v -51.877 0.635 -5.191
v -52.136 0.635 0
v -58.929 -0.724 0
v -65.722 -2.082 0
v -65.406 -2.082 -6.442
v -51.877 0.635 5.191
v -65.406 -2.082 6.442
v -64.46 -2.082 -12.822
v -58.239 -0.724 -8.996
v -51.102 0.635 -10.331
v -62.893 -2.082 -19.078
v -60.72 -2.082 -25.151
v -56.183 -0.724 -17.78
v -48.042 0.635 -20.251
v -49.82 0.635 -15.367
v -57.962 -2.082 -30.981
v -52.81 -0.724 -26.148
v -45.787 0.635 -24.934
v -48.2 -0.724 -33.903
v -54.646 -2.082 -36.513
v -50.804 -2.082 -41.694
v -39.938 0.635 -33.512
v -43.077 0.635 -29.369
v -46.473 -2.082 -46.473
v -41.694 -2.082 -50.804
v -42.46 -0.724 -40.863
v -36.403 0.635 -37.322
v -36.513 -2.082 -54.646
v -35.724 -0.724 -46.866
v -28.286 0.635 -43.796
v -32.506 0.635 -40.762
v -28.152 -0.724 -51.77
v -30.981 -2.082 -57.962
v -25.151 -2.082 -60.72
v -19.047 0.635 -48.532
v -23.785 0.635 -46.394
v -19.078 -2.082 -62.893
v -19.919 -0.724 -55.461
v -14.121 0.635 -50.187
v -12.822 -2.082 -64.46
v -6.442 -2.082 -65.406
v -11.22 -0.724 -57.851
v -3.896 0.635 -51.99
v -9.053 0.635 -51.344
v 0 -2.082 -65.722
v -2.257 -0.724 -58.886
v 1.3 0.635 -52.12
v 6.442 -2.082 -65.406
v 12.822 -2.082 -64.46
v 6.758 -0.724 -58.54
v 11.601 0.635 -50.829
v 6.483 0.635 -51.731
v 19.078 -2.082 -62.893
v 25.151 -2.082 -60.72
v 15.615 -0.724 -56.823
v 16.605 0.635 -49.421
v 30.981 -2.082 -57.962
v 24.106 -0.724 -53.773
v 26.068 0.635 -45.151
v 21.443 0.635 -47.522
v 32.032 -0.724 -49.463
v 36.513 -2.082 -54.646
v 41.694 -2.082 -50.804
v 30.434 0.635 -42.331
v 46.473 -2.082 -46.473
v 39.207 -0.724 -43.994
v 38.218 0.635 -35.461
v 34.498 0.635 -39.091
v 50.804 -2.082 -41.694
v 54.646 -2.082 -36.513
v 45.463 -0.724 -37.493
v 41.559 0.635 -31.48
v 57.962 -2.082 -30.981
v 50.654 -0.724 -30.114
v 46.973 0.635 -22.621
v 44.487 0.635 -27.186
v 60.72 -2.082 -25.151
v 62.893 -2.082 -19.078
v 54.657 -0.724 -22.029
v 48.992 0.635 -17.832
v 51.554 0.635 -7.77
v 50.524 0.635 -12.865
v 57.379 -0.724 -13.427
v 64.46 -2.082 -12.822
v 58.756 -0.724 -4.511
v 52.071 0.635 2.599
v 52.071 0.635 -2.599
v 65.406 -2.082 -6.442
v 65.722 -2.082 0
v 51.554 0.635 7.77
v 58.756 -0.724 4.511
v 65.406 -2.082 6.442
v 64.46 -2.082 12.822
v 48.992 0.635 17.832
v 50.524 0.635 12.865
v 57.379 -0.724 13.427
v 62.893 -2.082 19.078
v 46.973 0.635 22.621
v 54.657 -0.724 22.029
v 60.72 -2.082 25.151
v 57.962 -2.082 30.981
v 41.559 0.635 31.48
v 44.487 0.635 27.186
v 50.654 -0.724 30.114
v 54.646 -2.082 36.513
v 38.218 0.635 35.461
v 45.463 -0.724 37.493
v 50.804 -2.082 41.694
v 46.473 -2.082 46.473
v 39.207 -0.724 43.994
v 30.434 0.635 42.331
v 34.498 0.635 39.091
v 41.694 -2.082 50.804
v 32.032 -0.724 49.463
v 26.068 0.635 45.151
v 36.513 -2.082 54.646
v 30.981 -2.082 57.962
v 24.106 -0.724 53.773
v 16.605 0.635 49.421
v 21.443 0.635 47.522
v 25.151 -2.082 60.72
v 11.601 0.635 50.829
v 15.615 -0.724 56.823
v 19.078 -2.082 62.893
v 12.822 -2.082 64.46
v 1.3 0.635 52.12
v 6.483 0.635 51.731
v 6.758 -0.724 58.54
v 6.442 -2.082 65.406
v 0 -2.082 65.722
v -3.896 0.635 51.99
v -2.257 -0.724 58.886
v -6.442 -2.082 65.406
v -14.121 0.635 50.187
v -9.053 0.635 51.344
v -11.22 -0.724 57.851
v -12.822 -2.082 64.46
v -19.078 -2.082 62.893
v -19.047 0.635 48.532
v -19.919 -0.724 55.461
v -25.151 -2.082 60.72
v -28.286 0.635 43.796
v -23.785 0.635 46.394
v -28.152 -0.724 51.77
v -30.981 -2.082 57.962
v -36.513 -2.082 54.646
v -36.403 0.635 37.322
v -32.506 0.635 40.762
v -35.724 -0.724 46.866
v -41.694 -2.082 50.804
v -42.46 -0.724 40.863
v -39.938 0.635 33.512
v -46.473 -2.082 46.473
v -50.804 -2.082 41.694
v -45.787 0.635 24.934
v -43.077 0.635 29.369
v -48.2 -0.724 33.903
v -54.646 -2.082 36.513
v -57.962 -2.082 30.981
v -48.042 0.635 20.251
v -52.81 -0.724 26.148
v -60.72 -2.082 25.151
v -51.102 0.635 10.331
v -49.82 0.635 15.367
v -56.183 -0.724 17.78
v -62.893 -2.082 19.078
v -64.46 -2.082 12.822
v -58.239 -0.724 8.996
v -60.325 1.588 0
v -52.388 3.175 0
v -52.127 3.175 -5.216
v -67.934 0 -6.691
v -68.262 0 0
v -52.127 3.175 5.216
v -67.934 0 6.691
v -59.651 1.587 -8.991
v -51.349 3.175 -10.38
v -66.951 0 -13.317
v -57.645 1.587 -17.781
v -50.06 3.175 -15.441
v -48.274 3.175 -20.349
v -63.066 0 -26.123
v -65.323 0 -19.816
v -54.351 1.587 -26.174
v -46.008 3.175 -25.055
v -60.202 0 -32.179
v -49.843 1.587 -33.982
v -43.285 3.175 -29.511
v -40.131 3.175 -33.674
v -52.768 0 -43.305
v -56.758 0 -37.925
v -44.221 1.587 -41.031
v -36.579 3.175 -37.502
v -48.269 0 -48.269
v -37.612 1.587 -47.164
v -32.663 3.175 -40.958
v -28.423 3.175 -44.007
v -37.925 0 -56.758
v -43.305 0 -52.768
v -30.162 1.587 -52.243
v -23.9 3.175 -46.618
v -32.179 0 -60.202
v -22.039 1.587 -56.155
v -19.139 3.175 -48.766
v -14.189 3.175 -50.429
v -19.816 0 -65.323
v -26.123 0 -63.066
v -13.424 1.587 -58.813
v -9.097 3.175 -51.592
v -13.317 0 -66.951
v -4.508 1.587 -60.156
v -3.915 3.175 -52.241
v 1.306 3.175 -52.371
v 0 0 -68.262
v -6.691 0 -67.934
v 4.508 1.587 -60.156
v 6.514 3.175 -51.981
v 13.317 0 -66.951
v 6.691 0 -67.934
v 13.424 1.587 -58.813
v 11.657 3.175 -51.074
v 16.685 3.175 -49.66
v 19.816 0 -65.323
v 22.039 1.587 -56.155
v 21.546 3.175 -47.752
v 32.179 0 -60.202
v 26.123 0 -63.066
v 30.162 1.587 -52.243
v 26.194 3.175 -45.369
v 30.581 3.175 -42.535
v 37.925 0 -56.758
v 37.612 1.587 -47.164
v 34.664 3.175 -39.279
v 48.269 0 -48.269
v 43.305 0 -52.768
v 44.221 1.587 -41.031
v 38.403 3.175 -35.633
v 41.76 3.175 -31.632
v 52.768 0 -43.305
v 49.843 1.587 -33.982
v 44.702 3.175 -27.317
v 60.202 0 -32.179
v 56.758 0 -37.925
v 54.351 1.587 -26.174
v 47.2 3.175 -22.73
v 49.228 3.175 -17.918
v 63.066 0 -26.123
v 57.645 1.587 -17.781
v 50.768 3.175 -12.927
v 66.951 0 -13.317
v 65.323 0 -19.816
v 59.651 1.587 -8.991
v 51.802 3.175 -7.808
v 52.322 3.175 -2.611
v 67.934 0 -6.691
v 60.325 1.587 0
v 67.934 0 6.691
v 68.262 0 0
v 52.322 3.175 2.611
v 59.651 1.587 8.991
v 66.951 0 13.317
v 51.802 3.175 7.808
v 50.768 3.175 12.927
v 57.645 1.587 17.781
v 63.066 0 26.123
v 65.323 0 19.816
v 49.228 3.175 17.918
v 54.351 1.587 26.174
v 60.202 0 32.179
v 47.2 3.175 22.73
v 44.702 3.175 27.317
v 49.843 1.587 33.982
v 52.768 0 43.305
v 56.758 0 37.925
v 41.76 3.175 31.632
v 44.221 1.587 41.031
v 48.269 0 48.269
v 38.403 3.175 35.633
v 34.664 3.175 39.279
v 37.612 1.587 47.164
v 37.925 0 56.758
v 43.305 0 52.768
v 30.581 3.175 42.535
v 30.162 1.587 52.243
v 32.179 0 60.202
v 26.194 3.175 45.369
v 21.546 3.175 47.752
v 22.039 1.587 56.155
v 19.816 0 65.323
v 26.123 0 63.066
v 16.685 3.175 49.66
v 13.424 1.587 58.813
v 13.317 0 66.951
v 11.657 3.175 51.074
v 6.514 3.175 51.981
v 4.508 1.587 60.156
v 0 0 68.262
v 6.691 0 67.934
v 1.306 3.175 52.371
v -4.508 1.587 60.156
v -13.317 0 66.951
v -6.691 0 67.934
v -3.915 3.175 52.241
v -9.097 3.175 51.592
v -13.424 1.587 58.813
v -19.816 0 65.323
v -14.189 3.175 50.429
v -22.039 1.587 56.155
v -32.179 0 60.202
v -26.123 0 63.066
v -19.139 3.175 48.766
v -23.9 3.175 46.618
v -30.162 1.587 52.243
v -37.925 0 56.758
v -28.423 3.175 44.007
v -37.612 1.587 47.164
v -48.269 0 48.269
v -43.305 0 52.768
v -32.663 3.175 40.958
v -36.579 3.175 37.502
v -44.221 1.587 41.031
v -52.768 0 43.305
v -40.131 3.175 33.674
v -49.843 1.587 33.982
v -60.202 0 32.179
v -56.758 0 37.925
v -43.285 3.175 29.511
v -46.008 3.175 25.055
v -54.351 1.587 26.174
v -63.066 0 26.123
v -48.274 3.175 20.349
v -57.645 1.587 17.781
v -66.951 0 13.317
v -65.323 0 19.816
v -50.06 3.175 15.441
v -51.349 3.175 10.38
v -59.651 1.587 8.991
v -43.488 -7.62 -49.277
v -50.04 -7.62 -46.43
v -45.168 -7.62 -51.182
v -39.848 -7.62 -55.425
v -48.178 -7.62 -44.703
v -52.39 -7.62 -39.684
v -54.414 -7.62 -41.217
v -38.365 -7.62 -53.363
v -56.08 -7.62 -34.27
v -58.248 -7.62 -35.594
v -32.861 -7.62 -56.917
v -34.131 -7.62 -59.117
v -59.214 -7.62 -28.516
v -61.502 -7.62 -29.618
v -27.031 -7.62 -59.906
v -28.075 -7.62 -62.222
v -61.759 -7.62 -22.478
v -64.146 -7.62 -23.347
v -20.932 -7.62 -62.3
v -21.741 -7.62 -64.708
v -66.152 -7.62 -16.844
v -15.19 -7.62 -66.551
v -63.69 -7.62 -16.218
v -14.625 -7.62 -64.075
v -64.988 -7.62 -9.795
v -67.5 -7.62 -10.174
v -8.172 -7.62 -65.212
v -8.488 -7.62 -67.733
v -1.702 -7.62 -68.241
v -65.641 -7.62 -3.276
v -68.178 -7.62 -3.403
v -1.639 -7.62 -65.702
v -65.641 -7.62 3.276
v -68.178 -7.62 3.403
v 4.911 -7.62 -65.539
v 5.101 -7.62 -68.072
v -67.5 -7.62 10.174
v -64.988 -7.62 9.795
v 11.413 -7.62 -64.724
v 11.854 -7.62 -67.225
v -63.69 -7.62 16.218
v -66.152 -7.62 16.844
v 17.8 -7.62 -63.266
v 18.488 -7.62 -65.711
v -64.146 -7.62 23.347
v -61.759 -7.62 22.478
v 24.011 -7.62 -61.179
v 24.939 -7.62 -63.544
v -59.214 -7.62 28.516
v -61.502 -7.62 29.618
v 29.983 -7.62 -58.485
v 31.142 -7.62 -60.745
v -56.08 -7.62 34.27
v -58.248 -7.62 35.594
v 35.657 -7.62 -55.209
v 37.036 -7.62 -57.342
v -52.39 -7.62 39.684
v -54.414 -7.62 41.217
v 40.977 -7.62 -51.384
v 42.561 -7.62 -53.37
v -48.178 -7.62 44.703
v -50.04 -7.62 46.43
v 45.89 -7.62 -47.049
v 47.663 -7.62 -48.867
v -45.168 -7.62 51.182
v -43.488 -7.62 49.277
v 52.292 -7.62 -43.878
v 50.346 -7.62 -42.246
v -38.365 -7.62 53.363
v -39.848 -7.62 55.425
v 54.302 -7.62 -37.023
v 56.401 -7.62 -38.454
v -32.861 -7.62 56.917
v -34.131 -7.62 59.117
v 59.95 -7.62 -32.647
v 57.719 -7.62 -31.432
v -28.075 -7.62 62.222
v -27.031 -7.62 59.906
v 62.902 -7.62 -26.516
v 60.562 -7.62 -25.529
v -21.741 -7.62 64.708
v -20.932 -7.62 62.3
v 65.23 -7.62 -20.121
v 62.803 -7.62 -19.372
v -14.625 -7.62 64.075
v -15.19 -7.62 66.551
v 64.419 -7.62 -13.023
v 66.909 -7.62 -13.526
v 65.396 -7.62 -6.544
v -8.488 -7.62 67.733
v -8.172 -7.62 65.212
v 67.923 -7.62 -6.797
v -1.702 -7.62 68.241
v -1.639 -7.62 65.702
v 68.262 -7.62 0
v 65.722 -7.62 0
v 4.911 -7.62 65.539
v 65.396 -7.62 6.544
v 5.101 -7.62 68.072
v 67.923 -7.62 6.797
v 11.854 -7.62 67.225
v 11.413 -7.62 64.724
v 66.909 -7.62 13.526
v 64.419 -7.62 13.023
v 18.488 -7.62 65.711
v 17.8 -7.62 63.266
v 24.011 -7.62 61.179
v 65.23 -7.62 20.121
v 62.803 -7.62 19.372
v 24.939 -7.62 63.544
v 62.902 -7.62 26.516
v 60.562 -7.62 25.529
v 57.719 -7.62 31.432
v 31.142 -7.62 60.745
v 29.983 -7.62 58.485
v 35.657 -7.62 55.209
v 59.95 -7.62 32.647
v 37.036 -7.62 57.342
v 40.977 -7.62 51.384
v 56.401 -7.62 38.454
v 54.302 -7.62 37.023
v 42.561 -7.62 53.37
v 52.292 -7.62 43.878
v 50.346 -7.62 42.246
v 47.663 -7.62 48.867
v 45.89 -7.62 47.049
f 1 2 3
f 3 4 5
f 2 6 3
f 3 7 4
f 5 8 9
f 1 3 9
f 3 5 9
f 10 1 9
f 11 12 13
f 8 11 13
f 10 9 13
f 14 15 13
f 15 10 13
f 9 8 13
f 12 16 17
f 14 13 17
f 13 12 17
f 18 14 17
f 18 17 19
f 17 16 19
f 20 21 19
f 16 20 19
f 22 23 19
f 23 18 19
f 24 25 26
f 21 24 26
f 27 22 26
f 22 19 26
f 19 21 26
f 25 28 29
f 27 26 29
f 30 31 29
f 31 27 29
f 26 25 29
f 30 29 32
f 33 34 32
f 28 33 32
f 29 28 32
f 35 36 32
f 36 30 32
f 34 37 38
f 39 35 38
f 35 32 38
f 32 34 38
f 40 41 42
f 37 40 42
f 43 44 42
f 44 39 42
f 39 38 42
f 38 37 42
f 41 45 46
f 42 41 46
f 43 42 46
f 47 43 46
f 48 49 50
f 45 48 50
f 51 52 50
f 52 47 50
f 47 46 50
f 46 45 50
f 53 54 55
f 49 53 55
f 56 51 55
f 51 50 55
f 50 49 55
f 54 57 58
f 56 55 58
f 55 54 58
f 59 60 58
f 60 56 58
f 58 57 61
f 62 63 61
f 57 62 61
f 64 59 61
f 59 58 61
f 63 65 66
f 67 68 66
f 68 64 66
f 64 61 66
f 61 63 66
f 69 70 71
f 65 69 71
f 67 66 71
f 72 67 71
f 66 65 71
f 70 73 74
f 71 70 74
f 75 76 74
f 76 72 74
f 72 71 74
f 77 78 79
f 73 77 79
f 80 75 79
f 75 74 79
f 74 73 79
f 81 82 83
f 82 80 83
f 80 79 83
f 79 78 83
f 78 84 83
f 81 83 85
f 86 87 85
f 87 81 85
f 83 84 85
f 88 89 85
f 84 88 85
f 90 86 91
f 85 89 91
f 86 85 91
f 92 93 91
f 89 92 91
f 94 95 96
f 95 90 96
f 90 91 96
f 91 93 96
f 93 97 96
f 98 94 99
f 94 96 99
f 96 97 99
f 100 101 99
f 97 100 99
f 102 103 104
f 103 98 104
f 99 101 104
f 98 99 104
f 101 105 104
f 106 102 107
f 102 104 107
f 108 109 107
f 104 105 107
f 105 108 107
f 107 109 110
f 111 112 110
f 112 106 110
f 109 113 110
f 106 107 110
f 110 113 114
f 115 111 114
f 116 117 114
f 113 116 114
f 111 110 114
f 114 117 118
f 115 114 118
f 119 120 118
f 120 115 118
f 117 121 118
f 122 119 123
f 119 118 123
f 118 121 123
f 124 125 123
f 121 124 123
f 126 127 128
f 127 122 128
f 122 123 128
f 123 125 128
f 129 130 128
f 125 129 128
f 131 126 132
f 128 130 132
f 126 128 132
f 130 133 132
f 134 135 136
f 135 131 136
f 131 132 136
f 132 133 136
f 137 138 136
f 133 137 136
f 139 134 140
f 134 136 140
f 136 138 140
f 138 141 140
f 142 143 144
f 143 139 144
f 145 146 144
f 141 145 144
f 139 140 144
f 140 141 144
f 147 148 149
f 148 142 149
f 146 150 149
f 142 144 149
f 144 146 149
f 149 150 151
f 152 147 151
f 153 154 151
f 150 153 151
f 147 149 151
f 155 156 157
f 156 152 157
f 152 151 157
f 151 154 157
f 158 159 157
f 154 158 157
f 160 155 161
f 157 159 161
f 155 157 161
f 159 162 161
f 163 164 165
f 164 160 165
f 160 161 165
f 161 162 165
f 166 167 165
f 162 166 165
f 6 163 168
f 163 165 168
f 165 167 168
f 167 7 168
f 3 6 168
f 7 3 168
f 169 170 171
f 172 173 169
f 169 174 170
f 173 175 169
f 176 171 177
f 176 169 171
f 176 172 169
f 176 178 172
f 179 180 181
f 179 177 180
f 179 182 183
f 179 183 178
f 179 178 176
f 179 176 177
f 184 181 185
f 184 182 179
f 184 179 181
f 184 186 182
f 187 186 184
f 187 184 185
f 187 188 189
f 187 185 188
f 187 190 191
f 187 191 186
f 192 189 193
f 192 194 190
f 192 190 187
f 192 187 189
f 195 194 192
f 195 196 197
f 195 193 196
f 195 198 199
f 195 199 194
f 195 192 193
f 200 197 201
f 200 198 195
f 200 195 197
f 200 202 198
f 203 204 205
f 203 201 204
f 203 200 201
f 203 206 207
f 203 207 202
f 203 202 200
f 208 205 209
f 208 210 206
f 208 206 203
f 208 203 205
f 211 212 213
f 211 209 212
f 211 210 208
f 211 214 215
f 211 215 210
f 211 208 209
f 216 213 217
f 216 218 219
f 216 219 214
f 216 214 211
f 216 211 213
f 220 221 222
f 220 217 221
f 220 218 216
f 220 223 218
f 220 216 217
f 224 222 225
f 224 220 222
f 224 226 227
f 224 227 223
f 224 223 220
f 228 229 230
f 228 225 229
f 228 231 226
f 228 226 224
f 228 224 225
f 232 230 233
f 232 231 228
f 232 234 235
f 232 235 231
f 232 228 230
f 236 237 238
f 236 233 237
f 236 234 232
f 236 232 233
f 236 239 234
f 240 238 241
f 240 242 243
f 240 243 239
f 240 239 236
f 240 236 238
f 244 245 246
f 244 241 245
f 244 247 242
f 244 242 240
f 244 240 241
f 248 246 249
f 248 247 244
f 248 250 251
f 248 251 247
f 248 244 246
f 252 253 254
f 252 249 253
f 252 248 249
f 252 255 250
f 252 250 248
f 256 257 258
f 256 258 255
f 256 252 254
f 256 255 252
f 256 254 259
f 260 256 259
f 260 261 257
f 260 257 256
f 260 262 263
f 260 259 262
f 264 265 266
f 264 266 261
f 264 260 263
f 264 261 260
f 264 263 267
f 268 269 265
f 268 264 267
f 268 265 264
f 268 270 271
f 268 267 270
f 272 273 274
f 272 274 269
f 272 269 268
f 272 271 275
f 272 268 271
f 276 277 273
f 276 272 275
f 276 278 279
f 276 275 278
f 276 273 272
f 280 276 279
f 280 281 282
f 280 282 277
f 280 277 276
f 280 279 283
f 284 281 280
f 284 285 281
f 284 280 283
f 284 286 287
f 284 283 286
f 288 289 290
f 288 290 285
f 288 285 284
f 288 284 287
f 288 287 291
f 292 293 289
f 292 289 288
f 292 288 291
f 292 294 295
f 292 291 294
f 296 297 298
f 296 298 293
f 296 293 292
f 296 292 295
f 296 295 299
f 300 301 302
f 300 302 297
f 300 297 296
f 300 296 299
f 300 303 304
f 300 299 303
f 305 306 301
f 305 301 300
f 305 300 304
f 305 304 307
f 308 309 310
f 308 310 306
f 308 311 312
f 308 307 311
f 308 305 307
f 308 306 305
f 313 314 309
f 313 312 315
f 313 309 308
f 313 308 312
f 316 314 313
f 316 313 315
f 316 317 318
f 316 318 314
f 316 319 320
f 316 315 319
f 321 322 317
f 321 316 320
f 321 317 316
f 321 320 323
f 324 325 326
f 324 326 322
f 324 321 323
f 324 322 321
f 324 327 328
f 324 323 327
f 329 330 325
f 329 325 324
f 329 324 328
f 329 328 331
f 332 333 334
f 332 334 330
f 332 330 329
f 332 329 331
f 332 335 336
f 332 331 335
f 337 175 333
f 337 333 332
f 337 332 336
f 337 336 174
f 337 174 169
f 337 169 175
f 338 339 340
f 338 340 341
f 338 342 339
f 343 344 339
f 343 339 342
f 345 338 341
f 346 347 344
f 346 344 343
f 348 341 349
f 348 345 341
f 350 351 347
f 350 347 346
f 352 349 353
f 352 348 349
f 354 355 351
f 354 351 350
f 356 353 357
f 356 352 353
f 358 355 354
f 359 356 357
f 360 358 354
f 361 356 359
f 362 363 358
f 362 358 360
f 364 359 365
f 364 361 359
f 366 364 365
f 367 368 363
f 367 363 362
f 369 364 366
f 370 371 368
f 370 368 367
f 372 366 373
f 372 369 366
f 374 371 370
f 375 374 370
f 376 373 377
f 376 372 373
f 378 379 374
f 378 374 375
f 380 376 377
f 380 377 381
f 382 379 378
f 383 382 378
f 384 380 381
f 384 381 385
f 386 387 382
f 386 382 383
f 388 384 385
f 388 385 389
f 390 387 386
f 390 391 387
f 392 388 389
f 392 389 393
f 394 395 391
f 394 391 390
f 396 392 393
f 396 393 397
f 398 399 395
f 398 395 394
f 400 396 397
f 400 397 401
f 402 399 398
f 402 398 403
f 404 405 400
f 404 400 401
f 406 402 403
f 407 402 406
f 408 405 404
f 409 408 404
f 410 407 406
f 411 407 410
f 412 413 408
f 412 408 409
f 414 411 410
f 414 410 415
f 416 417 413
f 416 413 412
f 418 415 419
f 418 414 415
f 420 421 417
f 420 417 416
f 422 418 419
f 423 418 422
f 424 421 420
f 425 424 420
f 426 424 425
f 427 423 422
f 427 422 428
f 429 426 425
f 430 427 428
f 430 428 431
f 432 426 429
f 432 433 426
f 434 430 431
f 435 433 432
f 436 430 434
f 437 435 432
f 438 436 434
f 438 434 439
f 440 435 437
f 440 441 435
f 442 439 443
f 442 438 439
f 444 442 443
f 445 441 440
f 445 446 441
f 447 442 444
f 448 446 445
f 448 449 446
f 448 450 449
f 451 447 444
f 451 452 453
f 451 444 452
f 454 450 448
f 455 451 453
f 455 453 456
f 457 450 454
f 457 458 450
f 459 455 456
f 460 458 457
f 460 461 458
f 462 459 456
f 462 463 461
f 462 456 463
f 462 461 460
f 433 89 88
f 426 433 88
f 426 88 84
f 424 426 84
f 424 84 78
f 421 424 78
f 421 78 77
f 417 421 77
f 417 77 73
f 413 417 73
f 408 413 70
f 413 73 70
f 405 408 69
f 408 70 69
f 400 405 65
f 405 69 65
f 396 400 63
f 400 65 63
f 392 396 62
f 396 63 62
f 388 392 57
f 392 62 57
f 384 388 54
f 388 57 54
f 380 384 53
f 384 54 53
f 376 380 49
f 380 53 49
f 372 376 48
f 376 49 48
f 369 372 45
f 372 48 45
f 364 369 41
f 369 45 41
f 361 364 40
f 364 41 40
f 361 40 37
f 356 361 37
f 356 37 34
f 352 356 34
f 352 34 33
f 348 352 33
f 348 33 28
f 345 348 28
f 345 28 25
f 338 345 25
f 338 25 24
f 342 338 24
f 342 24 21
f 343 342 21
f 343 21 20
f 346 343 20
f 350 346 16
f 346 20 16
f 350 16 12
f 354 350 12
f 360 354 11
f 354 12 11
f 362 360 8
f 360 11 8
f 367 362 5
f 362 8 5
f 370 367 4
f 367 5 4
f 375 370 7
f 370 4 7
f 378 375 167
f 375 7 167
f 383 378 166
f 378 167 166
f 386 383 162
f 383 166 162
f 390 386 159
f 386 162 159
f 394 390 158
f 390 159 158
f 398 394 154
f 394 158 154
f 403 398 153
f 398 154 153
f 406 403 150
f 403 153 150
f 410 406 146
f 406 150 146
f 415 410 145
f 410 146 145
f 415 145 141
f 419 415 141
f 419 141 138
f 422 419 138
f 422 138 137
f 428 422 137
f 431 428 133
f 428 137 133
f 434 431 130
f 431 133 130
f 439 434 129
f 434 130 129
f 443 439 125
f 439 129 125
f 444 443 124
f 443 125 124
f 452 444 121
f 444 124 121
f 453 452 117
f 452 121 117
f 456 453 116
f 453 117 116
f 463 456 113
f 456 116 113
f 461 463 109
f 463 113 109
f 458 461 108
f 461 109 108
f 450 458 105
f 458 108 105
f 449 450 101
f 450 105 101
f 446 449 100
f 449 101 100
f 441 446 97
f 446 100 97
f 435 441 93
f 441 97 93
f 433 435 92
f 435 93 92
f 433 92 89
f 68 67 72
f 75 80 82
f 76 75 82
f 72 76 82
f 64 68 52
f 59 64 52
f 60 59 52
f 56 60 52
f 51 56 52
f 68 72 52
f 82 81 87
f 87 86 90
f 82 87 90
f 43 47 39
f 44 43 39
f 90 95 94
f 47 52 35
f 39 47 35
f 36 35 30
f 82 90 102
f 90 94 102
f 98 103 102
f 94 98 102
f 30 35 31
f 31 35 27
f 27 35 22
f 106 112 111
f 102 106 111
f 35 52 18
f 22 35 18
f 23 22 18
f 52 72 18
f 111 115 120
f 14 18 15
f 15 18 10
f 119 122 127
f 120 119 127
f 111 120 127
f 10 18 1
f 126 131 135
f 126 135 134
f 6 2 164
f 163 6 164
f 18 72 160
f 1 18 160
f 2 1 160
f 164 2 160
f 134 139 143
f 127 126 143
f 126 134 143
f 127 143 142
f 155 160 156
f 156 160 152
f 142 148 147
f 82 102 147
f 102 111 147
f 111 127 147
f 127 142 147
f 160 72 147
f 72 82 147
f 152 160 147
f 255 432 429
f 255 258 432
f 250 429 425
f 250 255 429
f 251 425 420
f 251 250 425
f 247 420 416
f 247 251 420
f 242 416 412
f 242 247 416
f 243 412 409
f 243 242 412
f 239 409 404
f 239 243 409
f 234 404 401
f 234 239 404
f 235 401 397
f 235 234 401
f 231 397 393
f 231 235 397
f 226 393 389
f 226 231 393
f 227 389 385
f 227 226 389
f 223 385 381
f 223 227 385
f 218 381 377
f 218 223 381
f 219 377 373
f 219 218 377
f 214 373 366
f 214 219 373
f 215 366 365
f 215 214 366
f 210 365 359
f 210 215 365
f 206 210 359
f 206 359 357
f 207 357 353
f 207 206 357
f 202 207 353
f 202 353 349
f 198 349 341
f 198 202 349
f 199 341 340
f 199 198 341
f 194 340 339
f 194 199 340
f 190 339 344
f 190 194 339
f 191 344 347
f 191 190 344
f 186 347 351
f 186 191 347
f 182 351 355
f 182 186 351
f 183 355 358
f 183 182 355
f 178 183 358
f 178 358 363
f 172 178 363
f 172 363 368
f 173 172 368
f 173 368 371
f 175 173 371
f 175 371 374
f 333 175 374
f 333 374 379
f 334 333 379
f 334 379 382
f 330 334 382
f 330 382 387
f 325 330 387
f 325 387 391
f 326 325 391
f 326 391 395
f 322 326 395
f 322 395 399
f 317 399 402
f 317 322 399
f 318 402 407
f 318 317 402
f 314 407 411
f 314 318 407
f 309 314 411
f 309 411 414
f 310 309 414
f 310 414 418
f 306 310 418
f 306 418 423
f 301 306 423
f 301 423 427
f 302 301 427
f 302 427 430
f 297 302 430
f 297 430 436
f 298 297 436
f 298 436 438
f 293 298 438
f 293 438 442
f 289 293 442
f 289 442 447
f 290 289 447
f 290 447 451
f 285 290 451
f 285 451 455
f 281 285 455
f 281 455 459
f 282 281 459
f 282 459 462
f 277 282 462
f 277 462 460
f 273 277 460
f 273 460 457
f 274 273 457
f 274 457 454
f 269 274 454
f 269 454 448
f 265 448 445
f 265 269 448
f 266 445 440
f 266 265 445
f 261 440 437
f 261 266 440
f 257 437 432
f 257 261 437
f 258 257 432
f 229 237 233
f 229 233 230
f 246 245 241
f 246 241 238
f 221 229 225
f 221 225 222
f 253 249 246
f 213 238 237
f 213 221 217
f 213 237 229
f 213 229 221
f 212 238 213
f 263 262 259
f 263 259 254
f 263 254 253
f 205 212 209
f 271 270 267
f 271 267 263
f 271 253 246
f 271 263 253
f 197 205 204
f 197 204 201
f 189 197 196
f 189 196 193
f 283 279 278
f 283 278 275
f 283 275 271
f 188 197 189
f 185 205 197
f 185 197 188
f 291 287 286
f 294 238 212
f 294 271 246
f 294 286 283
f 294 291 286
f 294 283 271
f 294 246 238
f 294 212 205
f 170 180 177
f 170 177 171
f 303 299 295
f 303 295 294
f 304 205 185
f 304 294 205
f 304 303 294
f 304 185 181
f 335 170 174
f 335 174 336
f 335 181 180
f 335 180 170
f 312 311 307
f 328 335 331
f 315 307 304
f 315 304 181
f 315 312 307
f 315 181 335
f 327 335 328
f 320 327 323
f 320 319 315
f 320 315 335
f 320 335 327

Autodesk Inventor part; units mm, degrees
ref_plane "YZ Plane" through (0, 0, 0) normal (1, 0, 0) x (0, 1, 0)
ref_plane "XY Plane" through (0, 0, 0) normal (0, 0, 1) x (1, 0, 0)
sketch "Sketch1" plane through (0, 0, 0) normal (0, 1, 0) x (-1, 0, 0)
  circle A0 centre (0, 0) radius 68.2625
  dimension "d0" = 136.525
ref_plane "Work Plane1" through (0, 3.175, 0) normal (0, 1, 0) x (-1, 0, 0)
sketch "Sketch2" plane through (0, 3.175, 0) normal (0, 1, 0) x (-1, 0, 0)
  circle A0 centre (0, 0) radius 52.3875
  dimension "d2" = 104.775
loft "Loft1" add profiles "Sketch1", "Sketch2"
sketch "Sketch3" plane through (0, 0, 0) normal (0, -1, 0) x (1, 0, 0)
  circle A0 centre (0, 0) radius 68.2625 projected
extrude "Extrusion1" add sketch "Sketch3" along normal blind 7.62
shell "Shell1" thickness 2.54 removed faces 1 at (13.9501, -7.62, -10.0034)
properties part number "speaker_cover"
